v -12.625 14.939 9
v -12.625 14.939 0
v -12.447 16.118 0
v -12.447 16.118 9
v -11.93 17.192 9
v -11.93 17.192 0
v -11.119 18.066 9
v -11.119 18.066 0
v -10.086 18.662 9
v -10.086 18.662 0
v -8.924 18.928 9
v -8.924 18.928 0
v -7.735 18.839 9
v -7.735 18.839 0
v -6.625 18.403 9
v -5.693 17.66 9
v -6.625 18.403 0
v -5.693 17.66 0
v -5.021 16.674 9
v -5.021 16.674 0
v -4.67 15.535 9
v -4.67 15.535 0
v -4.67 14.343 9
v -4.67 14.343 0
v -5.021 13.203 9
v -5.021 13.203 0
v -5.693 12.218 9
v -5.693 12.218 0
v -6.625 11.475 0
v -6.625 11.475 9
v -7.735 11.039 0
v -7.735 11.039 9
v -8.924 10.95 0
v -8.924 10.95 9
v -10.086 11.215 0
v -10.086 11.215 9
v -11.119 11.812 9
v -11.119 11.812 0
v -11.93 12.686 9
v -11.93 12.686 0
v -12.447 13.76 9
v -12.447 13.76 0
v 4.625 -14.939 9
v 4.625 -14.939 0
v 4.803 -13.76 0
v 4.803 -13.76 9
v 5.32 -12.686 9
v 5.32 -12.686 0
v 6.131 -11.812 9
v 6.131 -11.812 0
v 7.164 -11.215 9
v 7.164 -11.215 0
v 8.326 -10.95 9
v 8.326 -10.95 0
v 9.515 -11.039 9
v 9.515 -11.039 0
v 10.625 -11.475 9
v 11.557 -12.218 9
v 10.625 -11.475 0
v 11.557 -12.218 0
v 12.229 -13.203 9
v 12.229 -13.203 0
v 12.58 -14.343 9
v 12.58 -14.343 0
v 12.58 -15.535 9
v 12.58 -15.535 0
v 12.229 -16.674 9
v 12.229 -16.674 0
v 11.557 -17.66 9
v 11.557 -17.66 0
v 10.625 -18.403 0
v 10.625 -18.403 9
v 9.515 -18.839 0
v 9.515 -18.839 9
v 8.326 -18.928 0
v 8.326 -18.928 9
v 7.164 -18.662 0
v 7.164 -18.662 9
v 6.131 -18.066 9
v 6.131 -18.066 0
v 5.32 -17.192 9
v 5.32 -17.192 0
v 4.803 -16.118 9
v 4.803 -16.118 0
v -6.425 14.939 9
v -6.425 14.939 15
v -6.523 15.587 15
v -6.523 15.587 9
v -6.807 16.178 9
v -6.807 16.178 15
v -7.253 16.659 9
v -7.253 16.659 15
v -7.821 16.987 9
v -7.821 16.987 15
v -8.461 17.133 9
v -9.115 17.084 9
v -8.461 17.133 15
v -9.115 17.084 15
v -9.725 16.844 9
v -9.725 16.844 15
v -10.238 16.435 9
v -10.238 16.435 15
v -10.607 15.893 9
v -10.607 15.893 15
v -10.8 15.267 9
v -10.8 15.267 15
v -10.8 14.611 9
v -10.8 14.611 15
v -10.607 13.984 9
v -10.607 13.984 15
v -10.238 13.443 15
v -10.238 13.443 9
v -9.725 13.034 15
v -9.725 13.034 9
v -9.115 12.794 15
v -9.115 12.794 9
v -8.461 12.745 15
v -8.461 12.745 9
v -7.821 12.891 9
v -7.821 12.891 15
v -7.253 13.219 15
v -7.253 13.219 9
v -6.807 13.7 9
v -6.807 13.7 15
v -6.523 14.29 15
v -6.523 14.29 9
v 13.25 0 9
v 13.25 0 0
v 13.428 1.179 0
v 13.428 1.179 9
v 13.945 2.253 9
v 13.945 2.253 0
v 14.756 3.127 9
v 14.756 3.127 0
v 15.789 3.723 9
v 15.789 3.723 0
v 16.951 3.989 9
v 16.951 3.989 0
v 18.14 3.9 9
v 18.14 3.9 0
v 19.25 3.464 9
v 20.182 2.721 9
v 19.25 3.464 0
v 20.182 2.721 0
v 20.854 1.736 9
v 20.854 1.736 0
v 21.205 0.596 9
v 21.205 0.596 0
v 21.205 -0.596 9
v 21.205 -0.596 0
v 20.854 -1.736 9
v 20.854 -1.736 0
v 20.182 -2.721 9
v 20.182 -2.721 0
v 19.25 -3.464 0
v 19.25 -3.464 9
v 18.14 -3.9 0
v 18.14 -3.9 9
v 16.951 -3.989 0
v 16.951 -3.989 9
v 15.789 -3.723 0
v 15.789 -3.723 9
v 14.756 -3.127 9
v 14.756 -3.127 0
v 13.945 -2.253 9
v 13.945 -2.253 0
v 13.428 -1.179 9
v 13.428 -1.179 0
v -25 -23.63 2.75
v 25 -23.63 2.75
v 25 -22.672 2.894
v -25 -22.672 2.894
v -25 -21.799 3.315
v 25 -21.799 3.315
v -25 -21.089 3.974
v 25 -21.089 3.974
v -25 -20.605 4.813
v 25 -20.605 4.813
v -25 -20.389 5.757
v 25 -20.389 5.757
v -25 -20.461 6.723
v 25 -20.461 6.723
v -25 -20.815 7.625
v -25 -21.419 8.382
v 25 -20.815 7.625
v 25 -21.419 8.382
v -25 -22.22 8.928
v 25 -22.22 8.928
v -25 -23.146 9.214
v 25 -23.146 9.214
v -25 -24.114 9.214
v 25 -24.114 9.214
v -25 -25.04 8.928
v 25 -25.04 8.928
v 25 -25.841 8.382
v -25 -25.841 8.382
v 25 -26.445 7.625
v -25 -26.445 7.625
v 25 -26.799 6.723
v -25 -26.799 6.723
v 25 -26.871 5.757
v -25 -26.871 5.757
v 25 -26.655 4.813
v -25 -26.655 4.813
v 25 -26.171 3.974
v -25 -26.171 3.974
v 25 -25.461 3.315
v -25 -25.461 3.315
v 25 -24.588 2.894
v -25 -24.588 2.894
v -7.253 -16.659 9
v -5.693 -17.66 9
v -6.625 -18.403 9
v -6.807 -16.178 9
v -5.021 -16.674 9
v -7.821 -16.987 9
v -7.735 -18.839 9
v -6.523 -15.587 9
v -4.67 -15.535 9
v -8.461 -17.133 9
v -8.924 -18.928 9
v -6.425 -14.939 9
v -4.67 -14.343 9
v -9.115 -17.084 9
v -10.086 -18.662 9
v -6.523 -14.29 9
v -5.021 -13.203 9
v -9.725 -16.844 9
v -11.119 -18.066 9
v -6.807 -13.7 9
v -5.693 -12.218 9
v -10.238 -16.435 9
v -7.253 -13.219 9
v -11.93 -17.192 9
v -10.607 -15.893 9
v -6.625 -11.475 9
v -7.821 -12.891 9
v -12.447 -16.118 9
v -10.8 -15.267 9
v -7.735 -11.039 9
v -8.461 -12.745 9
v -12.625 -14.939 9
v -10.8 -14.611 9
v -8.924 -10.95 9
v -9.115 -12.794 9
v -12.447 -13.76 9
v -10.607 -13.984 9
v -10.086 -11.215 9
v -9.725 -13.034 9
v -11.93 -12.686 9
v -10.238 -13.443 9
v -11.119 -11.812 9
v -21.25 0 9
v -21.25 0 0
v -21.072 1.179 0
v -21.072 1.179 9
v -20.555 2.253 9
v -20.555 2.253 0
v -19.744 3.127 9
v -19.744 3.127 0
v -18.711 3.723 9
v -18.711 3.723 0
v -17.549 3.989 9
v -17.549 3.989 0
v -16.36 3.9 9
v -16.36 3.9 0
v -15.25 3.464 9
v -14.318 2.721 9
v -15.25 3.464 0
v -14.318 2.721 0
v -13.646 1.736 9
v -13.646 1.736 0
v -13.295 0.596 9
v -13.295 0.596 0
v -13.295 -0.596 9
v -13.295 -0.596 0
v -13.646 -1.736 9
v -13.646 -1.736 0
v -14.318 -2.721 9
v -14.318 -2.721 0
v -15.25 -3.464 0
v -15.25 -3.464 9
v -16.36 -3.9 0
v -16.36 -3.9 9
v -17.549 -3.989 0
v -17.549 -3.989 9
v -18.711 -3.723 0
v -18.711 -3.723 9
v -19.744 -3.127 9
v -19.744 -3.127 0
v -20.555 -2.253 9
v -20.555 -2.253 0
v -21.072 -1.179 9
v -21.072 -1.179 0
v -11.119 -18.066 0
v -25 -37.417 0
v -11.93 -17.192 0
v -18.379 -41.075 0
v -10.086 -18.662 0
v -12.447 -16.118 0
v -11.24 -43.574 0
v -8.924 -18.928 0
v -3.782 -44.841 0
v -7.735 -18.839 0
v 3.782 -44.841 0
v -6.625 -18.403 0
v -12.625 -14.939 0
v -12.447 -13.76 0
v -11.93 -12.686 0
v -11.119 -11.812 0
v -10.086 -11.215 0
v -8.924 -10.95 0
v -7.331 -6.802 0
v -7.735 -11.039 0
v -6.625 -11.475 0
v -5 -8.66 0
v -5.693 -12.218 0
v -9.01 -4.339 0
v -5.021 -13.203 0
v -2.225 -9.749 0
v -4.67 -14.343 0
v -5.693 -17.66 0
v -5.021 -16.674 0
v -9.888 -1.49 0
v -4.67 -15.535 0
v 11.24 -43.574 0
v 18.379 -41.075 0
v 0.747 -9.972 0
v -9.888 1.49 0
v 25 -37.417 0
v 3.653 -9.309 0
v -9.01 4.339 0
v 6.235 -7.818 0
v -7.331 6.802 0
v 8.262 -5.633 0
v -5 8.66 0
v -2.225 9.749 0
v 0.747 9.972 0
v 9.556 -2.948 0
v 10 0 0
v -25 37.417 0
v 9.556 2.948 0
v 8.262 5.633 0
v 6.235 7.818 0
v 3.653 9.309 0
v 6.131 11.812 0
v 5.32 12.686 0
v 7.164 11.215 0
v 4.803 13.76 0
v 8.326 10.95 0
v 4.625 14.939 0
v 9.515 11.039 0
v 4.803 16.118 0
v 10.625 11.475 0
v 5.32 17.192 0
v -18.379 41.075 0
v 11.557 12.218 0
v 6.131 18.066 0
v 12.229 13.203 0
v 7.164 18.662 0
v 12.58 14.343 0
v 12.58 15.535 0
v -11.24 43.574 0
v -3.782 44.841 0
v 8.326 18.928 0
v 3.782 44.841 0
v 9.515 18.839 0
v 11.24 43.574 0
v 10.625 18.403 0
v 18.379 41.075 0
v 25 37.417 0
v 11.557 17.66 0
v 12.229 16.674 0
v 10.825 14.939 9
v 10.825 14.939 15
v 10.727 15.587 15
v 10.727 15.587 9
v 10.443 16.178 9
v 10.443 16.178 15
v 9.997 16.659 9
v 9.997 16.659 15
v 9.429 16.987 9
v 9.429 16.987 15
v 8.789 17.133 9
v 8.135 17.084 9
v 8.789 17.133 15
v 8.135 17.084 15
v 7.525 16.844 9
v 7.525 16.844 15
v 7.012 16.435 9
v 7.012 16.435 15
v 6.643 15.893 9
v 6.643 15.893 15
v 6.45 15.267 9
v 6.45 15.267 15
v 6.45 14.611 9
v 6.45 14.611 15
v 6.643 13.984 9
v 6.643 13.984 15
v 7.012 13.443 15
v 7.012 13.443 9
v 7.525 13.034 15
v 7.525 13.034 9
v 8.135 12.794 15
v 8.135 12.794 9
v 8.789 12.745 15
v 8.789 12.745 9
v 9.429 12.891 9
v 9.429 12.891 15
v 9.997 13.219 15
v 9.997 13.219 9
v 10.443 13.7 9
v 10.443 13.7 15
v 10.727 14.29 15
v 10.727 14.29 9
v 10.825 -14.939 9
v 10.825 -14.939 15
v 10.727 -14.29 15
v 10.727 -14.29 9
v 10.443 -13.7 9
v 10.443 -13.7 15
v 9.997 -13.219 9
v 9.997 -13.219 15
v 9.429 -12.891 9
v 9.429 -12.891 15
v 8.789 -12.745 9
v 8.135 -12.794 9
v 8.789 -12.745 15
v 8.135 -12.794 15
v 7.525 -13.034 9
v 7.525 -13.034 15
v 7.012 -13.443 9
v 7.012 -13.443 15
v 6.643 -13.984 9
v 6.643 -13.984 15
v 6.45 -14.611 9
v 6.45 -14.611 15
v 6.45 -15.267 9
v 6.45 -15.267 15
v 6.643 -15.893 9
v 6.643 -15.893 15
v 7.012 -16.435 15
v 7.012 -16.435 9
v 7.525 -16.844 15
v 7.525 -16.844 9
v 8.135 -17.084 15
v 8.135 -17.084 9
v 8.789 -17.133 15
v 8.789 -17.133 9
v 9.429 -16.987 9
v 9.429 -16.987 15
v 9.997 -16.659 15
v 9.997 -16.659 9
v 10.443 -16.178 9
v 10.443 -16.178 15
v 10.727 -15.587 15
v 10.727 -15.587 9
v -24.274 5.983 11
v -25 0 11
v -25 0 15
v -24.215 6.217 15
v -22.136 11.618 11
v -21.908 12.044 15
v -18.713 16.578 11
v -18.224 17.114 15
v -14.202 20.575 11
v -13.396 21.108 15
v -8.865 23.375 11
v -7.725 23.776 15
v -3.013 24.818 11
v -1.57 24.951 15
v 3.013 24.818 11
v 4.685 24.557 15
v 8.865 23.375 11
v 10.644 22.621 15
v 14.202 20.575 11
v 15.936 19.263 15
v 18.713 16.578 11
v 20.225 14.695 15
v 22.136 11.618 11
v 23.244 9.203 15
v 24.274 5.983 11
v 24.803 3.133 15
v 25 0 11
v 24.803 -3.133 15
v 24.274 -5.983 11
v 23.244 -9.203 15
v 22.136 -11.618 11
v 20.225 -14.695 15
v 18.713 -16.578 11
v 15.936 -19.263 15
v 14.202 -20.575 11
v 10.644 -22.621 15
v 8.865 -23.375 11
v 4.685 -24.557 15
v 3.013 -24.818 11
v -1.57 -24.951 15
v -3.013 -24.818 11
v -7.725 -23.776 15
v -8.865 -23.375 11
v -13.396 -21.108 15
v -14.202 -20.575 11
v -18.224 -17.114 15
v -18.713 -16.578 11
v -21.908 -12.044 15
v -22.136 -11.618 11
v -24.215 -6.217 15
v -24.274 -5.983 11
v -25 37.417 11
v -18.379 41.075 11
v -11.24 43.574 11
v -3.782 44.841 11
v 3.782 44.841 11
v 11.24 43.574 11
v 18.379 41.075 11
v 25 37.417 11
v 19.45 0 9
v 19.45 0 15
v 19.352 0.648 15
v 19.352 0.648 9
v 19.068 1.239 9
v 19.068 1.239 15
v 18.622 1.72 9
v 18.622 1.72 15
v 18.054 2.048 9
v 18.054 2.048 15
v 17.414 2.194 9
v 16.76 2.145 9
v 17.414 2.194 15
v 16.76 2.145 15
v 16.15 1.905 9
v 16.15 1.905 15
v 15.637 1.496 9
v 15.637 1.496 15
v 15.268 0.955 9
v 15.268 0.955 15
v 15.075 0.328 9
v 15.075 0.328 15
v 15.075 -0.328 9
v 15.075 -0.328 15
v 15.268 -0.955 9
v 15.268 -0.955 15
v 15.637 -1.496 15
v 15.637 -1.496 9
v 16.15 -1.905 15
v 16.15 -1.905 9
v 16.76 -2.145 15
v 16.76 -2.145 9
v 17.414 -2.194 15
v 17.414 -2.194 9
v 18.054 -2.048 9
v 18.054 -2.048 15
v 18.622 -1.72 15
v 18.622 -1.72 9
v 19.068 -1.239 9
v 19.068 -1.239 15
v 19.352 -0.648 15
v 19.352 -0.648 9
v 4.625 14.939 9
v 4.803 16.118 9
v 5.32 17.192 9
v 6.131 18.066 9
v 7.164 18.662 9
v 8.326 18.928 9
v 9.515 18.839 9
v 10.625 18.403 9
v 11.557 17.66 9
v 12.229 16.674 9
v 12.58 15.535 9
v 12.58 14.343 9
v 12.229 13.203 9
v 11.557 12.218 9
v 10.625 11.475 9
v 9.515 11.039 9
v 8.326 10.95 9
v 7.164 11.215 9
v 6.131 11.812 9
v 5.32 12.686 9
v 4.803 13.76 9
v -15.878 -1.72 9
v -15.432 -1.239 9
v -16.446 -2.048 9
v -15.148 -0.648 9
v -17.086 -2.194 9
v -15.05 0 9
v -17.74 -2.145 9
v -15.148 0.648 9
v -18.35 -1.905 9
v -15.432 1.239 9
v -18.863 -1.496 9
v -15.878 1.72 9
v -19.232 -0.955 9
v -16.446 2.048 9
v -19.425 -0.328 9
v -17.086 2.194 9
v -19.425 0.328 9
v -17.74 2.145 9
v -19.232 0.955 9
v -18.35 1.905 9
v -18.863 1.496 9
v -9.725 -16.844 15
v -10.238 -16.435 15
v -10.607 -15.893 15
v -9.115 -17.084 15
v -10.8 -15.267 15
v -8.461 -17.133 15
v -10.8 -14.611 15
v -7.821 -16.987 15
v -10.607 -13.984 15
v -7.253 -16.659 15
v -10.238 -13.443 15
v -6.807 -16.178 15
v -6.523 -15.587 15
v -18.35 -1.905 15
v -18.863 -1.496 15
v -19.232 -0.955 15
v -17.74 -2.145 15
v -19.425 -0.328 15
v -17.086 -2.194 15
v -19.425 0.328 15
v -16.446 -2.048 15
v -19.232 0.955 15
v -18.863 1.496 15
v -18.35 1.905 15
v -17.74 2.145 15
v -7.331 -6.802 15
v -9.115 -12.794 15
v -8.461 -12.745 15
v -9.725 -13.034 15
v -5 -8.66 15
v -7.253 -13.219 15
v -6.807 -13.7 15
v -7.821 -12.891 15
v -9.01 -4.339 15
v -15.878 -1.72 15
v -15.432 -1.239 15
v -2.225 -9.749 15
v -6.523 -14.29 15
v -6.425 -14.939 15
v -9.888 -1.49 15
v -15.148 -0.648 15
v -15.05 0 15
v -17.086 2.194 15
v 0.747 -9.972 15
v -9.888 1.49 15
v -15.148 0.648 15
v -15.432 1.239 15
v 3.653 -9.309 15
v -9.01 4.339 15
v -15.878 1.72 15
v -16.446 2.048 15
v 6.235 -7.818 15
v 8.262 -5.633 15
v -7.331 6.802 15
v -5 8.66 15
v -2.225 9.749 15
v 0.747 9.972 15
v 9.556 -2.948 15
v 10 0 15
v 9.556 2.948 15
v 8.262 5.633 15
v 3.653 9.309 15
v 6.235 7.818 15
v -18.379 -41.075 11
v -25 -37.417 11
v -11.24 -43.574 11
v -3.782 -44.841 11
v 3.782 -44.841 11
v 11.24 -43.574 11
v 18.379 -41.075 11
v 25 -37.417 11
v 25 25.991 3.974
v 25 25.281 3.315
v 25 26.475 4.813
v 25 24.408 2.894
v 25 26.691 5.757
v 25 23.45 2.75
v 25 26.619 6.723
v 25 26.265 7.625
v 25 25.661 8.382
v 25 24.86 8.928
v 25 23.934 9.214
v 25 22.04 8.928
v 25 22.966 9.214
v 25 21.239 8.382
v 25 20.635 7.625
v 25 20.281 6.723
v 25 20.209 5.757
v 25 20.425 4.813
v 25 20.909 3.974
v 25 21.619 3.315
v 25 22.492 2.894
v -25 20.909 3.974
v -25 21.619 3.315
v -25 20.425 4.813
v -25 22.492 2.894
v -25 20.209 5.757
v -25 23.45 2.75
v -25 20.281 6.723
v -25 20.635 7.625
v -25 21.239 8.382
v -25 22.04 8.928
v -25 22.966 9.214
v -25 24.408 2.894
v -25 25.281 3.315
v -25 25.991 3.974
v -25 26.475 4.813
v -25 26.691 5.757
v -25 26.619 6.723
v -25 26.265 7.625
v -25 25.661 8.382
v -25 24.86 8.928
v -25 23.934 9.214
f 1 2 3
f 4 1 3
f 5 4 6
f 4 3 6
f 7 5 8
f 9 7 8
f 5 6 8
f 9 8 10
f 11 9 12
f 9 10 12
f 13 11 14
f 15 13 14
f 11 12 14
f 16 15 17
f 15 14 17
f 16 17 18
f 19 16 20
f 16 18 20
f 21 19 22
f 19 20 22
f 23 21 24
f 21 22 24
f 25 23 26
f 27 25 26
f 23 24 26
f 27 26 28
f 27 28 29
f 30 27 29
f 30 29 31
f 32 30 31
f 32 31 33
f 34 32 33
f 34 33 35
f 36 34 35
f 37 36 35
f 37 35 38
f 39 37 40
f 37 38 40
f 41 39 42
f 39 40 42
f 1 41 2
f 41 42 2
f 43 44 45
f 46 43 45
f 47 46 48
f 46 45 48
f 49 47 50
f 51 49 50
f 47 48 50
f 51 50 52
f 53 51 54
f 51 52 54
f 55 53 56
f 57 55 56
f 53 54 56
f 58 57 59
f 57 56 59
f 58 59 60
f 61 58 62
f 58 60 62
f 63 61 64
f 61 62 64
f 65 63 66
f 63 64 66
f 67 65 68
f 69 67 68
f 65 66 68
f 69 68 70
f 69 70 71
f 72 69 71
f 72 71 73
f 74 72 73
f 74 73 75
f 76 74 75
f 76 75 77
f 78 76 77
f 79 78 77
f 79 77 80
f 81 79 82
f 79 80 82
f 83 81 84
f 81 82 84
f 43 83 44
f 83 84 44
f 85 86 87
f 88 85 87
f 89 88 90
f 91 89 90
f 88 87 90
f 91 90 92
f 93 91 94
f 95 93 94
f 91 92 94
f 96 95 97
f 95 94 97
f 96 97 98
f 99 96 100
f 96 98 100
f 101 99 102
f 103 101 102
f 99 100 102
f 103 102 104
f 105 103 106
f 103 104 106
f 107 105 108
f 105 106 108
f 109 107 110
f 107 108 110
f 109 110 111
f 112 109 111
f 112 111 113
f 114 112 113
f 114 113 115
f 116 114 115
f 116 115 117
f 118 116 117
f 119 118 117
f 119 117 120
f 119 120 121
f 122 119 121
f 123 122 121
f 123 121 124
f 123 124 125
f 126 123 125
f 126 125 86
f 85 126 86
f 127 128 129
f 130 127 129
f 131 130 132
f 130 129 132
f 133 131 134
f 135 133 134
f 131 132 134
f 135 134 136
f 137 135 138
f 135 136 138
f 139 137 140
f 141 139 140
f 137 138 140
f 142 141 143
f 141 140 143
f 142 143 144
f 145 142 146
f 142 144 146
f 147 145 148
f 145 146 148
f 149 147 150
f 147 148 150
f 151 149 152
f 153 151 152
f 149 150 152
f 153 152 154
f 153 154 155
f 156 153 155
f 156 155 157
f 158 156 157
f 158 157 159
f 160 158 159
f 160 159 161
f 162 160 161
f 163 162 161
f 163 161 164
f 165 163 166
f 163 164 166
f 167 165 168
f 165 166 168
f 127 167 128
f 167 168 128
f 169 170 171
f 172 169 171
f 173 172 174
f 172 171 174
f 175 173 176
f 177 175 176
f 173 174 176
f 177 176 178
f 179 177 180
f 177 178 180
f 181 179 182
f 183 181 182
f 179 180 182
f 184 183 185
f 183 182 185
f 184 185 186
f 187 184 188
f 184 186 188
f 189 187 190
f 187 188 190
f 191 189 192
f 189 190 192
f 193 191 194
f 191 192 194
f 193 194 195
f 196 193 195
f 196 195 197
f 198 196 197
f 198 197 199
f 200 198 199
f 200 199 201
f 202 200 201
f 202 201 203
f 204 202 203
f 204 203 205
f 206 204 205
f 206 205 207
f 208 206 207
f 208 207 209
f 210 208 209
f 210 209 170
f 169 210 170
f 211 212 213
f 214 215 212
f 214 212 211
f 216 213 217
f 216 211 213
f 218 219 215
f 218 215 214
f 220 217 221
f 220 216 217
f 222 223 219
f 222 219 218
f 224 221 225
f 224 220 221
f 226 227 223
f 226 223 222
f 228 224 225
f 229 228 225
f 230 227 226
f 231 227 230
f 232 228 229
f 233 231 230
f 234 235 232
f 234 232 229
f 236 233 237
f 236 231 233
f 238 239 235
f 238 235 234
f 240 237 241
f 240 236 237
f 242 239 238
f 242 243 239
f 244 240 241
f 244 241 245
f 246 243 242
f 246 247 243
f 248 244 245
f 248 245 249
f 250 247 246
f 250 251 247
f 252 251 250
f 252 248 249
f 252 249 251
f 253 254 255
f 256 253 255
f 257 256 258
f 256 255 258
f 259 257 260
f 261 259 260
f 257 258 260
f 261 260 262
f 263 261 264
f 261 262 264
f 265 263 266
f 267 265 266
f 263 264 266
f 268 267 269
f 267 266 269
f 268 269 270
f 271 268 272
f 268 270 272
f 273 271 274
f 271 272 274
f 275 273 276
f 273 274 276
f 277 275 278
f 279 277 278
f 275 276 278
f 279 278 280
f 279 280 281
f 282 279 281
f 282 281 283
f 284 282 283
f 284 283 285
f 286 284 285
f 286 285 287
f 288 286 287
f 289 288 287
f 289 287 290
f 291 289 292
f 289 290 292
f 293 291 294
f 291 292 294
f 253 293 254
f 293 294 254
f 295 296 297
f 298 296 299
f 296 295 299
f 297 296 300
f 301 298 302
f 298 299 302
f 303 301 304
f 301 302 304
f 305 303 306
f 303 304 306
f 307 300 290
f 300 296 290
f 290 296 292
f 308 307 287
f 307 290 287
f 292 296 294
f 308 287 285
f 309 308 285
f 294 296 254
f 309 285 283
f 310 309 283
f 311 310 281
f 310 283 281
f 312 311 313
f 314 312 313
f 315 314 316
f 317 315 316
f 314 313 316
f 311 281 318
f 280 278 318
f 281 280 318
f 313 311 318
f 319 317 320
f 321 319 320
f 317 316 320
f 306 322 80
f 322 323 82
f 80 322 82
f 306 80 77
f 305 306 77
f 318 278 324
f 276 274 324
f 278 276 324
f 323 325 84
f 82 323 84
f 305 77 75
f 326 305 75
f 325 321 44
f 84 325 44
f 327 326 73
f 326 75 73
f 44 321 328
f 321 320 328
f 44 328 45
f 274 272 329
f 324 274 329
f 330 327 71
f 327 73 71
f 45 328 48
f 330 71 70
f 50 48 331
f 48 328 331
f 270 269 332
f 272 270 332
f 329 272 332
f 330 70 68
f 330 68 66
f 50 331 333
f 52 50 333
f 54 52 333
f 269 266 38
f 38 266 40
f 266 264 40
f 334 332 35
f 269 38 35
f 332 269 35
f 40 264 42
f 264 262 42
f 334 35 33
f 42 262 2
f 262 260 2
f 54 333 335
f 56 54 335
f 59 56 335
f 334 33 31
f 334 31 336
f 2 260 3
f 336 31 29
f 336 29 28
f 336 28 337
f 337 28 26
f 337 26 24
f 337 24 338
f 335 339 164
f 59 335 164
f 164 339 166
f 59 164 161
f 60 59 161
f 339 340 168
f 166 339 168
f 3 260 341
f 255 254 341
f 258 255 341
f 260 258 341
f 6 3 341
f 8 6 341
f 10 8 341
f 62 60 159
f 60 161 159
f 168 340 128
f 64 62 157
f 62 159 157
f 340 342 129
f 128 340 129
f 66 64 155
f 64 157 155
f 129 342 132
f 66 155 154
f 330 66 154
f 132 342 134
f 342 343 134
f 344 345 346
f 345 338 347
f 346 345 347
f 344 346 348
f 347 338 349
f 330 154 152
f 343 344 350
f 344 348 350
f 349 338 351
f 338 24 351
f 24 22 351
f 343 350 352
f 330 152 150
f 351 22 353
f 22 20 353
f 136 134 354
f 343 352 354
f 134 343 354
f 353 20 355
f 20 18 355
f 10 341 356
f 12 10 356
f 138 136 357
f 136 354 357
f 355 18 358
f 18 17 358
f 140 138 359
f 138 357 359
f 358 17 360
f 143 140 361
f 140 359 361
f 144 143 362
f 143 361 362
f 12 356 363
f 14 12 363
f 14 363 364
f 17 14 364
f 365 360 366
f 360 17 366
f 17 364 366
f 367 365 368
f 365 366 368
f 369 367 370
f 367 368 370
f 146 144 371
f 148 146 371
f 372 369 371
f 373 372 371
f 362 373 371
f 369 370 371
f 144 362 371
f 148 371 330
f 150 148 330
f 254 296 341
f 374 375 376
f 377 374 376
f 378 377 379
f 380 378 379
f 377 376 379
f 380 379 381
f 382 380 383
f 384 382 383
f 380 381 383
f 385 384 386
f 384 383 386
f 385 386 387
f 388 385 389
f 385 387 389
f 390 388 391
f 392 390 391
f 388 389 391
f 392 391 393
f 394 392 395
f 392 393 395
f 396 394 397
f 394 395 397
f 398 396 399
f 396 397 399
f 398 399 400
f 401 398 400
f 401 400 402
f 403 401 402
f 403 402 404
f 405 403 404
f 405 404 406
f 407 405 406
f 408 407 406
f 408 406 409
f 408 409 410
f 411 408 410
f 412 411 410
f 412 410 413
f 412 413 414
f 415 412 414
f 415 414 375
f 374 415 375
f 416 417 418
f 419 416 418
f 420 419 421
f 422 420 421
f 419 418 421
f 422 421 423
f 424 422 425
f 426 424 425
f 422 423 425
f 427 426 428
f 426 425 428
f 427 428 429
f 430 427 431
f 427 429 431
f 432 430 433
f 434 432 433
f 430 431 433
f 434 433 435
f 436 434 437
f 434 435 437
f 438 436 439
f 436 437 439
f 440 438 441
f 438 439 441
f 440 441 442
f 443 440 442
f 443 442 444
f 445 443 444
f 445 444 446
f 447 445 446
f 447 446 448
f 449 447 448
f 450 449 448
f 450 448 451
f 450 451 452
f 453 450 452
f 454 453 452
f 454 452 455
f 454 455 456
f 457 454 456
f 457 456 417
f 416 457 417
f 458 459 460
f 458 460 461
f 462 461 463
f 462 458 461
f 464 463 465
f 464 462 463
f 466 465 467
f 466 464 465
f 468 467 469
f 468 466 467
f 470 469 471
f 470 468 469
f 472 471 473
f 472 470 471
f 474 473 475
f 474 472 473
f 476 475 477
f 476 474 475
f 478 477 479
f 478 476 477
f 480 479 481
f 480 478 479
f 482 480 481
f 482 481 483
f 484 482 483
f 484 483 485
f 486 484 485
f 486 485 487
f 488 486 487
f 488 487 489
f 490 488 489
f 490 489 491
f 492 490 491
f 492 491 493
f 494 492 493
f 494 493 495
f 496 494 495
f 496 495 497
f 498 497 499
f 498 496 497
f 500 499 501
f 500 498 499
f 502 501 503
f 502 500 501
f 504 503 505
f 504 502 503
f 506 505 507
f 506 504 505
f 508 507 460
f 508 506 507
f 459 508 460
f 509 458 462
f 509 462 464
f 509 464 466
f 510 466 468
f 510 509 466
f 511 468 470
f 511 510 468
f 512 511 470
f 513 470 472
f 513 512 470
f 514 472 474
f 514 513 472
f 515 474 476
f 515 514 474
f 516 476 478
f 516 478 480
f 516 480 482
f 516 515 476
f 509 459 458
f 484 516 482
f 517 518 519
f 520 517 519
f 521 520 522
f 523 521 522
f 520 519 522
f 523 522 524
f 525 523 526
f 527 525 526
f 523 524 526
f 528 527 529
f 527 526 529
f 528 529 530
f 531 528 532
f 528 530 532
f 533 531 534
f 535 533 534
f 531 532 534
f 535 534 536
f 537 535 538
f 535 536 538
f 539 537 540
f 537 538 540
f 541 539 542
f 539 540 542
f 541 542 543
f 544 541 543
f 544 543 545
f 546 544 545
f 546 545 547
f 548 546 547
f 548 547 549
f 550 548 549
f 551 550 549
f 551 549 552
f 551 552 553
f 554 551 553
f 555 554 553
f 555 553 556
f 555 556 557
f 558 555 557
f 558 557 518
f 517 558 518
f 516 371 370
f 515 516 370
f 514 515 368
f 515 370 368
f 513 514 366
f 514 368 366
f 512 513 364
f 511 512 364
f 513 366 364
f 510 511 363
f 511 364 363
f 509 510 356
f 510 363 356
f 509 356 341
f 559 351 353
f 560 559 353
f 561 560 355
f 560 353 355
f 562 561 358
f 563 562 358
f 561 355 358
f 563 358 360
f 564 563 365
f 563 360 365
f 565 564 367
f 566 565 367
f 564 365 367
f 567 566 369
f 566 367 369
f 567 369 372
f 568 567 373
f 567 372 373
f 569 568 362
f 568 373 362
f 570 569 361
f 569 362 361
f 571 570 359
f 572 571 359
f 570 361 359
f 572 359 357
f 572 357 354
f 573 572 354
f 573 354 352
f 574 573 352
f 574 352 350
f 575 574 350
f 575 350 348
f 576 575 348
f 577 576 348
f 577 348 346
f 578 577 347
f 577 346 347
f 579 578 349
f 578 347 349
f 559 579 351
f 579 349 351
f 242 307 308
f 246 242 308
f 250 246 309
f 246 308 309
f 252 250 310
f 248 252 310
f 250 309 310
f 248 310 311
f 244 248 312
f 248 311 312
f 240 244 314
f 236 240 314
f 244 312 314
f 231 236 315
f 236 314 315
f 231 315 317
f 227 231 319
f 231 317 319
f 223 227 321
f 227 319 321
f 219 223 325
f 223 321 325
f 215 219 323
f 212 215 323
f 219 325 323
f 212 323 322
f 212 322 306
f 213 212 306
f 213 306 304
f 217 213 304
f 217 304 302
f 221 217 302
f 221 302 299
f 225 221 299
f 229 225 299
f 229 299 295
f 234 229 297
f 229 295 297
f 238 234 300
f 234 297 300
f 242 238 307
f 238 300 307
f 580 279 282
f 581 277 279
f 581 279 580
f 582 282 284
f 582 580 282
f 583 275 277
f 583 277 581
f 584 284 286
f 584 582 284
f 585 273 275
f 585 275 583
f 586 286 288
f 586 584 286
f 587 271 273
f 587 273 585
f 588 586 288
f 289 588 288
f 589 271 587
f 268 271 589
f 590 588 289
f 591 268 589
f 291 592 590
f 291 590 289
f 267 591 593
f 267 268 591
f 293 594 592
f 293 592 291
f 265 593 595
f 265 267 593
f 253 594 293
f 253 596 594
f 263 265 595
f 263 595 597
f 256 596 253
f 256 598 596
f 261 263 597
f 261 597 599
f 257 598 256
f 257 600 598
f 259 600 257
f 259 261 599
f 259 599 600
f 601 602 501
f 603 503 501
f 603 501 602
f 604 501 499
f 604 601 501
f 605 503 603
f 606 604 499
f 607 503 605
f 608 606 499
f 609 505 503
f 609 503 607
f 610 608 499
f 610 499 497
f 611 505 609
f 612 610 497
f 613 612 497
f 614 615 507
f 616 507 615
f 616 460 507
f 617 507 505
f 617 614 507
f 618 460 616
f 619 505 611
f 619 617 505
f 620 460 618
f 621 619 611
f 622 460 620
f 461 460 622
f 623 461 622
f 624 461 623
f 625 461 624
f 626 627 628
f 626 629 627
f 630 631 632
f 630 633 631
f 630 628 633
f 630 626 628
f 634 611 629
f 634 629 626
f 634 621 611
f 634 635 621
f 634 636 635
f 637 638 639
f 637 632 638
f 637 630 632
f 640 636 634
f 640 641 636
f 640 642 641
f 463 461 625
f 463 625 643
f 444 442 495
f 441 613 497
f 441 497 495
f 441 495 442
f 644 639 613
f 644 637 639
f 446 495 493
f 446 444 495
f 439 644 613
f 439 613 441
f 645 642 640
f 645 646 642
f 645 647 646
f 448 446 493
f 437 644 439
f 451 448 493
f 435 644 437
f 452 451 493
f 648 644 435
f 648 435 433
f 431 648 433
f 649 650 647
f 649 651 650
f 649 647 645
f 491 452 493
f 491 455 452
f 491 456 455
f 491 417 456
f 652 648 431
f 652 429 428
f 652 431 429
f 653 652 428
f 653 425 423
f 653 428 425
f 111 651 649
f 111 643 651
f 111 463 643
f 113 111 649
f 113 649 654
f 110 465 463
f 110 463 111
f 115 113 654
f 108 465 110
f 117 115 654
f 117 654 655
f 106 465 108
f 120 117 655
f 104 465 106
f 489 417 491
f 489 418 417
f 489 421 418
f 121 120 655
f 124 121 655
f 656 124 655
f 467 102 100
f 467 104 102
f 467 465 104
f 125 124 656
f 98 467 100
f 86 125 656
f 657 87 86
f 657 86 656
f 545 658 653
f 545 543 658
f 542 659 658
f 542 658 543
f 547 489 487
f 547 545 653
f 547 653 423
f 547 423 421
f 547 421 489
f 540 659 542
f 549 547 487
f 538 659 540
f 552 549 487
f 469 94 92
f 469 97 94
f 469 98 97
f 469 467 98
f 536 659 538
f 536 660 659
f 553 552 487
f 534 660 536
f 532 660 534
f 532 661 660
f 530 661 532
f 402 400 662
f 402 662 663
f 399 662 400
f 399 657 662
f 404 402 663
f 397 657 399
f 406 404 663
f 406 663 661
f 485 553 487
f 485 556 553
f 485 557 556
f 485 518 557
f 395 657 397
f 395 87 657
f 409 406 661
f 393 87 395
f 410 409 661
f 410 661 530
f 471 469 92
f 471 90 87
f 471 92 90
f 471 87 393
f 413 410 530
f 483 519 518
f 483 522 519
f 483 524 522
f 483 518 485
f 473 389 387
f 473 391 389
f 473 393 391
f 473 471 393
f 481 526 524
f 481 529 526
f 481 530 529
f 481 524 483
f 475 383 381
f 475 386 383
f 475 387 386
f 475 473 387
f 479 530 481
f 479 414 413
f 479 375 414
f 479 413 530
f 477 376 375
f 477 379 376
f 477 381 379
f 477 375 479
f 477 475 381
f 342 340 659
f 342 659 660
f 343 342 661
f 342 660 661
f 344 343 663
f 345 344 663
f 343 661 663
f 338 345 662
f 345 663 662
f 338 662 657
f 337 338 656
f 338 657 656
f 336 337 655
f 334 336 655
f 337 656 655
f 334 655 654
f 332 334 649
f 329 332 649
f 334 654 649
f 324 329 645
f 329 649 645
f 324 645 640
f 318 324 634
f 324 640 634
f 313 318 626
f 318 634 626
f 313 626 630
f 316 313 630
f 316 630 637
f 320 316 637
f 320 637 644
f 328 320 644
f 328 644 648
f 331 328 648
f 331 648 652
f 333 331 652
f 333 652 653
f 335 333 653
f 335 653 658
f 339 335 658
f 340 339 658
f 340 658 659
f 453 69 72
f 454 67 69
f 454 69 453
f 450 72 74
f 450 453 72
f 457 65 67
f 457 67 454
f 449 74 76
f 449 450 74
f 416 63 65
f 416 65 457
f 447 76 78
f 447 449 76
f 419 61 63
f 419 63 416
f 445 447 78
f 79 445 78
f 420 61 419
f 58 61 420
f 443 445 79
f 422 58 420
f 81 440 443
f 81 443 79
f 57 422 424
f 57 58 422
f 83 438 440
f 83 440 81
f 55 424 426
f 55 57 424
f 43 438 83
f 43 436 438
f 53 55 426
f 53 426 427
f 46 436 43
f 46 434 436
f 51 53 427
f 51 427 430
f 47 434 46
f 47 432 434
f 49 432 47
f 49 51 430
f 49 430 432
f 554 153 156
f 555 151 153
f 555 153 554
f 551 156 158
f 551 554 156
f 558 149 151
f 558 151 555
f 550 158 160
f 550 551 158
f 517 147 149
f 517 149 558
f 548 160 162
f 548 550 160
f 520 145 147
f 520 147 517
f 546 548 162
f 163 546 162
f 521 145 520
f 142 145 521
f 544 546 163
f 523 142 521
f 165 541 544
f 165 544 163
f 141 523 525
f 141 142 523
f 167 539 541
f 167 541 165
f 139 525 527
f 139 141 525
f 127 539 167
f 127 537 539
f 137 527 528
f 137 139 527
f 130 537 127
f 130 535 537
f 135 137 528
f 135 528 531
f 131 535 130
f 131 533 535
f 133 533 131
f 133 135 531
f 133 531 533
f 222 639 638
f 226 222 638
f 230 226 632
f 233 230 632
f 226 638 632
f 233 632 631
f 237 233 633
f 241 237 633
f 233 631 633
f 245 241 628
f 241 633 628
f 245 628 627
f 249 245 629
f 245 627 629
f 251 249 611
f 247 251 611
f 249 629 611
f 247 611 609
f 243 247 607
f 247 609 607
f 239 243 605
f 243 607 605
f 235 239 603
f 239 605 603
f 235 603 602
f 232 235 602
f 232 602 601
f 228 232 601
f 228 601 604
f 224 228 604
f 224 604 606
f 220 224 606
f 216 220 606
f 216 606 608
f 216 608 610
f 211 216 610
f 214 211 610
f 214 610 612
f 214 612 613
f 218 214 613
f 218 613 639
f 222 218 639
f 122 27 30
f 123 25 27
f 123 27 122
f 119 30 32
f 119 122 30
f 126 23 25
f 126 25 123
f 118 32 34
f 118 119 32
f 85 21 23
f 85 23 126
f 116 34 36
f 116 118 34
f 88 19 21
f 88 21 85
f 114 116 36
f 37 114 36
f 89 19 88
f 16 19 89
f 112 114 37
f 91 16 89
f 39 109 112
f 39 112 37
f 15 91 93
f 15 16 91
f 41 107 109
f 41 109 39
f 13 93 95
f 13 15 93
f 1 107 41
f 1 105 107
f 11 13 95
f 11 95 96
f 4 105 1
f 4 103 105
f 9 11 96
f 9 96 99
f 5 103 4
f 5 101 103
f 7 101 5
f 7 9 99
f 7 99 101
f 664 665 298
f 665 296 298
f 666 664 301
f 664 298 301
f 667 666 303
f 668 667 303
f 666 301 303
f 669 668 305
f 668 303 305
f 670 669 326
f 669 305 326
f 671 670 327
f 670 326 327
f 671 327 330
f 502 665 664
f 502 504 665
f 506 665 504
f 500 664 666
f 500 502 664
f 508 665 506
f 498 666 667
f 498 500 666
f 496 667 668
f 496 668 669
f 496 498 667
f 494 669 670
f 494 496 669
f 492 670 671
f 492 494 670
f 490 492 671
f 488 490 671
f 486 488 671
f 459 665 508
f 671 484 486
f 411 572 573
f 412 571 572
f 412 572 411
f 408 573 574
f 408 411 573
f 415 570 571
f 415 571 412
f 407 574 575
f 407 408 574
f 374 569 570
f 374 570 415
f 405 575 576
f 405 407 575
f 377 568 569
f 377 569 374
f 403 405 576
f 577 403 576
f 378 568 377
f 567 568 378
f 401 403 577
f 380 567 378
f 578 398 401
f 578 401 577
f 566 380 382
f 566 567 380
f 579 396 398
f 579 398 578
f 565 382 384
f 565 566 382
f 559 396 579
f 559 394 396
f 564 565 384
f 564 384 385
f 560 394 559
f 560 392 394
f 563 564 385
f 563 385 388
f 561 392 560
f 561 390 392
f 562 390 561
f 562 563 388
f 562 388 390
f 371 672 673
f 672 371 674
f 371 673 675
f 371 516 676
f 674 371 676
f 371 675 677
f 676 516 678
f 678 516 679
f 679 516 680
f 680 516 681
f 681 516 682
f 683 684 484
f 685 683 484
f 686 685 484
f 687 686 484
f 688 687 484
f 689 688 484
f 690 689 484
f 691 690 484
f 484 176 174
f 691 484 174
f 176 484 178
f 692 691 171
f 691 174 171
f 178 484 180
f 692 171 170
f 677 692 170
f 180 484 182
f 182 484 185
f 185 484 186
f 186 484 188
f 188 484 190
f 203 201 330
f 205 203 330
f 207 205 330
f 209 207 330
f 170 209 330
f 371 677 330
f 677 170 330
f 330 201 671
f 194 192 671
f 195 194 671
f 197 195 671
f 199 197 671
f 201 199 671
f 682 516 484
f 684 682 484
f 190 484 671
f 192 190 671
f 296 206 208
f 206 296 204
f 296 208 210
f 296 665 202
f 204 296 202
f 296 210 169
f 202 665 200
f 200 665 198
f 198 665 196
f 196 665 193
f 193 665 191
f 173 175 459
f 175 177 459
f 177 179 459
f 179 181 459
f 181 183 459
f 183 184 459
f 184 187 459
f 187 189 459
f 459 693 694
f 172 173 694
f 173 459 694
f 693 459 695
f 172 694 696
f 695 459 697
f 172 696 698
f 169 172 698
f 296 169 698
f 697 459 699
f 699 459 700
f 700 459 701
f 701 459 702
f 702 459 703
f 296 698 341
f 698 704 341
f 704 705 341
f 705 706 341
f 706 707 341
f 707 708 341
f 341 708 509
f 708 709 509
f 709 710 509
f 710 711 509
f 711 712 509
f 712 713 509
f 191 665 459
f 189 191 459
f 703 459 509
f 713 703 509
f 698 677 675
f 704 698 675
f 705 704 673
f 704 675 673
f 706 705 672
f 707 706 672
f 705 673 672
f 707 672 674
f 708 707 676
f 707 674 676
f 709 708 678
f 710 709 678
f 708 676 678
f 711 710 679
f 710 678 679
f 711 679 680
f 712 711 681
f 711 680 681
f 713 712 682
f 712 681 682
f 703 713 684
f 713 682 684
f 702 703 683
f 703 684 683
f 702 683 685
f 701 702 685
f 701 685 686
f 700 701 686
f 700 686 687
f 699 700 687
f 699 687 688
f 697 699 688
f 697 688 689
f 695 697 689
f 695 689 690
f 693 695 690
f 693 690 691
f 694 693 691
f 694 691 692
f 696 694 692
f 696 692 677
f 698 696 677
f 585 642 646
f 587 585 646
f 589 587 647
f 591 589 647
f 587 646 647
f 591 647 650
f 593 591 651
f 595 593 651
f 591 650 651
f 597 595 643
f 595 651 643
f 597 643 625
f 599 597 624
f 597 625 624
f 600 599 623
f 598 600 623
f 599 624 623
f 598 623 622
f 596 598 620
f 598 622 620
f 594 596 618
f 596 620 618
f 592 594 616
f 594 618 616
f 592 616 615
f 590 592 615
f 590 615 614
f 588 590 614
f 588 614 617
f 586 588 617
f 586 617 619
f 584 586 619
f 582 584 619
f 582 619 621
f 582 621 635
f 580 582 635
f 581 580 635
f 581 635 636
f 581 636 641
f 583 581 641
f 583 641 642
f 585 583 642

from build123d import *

# Parameters (mm, degrees)
SKETCH_1_R           = 45
EXTRUDE_1_DEPTH      = 15
SKETCH_6_R           = 10
CUT_EXTRUDE_5_DEPTH  = 26
SKETCH_7_R           = 2.2
CUT_EXTRUDE_6_DEPTH  = 66.383484153
CUT_EXTRUDE_7_DEPTH  = 66.383484153
SKETCH_9_R           = 3.25
CUT_EXTRUDE_8_DEPTH  = 69.92024376
SKETCH_11_R          = 4
CUT_EXTRUDE_9_DEPTH  = 9
CUT_EXTRUDE_START    = -4
CUT_EXTRUDE_10_DEPTH = 4


with BuildPart() as part:
    # 草图1 → 凸台-拉伸1 (new body)
    with BuildSketch(Plane.XY):
        Circle(SKETCH_1_R)
    extrude(amount=EXTRUDE_1_DEPTH)

    # 草图6 → 切除-拉伸5 (cut)
    with BuildSketch(Plane.XY.offset(15)):
        Circle(SKETCH_6_R)
    extrude(amount=-CUT_EXTRUDE_5_DEPTH, mode=Mode.SUBTRACT)

    # 草图7 → 切除-拉伸6 (cut, through all)
    with BuildSketch(Plane.XY.offset(15)):
        with Locations((17.25, 0)):
            Circle(SKETCH_7_R)
        with Locations((8.625, -14.938938215)):
            Circle(SKETCH_7_R)
        with Locations((-8.625, -14.938938215)):
            Circle(SKETCH_7_R)
        with Locations((-17.25, 0)):
            Circle(SKETCH_7_R)
        with Locations((-8.625, 14.938938215)):
            Circle(SKETCH_7_R)
        with Locations((8.625, 14.938938215)):
            Circle(SKETCH_7_R)
    extrude(amount=-CUT_EXTRUDE_6_DEPTH, mode=Mode.SUBTRACT)

    # 草图8 → 切除-拉伸7 (cut, through all)
    with BuildSketch(Plane.XY.offset(15)):
        with BuildLine():
            ThreePointArc((-25, 37.416573868), (-45, 0), (-25, -37.416573868))
            Line((-25, -37.416573868), (-25, 37.416573868))
        make_face()
        with BuildLine():
            Line((25, 37.416573868), (25, -37.416573868))
            ThreePointArc((25, -37.416573868), (39.686269666, -21.213203436), (45, 0))
            ThreePointArc((45, 0), (39.686269666, 21.213203436), (25, 37.416573868))
        make_face()
    extrude(amount=-CUT_EXTRUDE_7_DEPTH, mode=Mode.SUBTRACT)

    # 草图9 → 切除-拉伸8 (cut, through all)
    with BuildSketch(Plane(origin=(25, 0, 0), x_dir=(0, 0, -1), z_dir=(1, 0, 0))):
        with Locations((-6, 23.45)):
            Circle(SKETCH_9_R)
        with Locations((-6, -23.63)):
            Circle(SKETCH_9_R)
    extrude(amount=-CUT_EXTRUDE_8_DEPTH, mode=Mode.SUBTRACT)

    # 草图11 → 切除-拉伸9 (cut)
    with BuildSketch(Plane(origin=(0, 0, 0), x_dir=(-1, 0, 0), z_dir=(0, 0, -1))):
        with Locations((-8.625, 14.938938215)):
            Circle(SKETCH_11_R)
        with Locations((-17.25, 0)):
            Circle(SKETCH_11_R)
        with Locations((-8.625, -14.938938215)):
            Circle(SKETCH_11_R)
        with Locations((8.625, 14.938938215)):
            Circle(SKETCH_11_R)
        with Locations((8.625, -14.938938215)):
            Circle(SKETCH_11_R)
        with Locations((17.25, 0)):
            Circle(SKETCH_11_R)
    extrude(amount=-CUT_EXTRUDE_9_DEPTH, mode=Mode.SUBTRACT)

    # 草图13 → 切除-拉伸10 (cut)
    with BuildSketch(Plane.XY.offset(15).offset(CUT_EXTRUDE_START)):
        with BuildLine():
            ThreePointArc((25, 37.416573868), (0, 45), (-25, 37.416573868))
            Line((-25, 37.416573868), (-25, 2.6e-08))
            ThreePointArc((-25, 2.6e-08), (1.3e-08, 25), (25, 0))
            Line((25, 0), (25, 37.416573868))
        make_face()
        with BuildLine():
            ThreePointArc((25, 0), (-1.3e-08, -25), (-25, 2.6e-08))
            Line((-25, 2.6e-08), (-25, -37.416573868))
            ThreePointArc((-25, -37.416573868), (0, -45), (25, -37.416573868))
            Line((25, -37.416573868), (25, 0))
        make_face()
    extrude(amount=CUT_EXTRUDE_10_DEPTH, mode=Mode.SUBTRACT)


solid = part.part
